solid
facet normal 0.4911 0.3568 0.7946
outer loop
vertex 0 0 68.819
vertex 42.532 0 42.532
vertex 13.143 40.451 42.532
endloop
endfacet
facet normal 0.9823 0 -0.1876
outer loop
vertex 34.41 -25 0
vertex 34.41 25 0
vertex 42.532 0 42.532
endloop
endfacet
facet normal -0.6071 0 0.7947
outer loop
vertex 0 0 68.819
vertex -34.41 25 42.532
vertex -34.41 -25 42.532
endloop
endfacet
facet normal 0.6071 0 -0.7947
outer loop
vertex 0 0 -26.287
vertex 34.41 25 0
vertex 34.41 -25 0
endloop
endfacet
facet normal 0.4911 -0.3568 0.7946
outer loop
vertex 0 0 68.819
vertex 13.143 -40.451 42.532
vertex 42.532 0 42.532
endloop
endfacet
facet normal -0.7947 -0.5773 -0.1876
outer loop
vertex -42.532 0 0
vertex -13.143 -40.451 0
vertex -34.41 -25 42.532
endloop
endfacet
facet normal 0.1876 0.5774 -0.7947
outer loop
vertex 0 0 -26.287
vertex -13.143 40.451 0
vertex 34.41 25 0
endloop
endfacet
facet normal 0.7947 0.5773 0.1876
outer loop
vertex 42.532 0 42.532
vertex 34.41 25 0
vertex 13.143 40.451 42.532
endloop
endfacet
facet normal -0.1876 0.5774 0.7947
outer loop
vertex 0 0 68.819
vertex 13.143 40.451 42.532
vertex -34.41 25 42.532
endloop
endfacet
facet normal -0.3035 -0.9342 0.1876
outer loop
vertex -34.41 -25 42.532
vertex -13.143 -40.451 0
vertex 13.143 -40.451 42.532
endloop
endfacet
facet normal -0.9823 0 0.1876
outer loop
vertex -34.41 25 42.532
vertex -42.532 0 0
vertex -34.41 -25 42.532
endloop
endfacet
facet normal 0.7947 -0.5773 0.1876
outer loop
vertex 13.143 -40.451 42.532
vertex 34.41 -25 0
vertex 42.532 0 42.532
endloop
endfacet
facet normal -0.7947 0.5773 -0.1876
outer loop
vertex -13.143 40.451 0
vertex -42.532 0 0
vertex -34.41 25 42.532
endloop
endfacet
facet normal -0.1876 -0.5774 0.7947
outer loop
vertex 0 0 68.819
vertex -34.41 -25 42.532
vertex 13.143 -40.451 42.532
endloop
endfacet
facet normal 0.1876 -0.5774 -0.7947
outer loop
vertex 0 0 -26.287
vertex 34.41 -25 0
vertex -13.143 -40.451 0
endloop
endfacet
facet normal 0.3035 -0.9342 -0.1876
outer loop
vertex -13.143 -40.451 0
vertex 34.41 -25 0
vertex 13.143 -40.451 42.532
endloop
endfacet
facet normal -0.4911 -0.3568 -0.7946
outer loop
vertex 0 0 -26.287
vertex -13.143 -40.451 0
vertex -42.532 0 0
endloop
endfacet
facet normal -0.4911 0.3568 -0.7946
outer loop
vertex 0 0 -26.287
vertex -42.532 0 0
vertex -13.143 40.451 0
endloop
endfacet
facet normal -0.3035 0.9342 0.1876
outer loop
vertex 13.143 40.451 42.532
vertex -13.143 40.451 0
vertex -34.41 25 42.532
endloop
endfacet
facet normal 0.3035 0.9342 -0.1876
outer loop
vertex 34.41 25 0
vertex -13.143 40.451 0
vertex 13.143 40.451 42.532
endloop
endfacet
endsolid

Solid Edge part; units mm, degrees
sketch "Sketch1" plane through (0, 0, 0) normal (0, -1, 0) x (1, 0, 0)
  arc A0 (0, -40.3674) -> (0, 87.4202) centre (0, 23.5264) cw
  line L0 (0, 87.4202) -> (0, -40.3674)
revolve "RevolvedProtrusion1" add sketch "Sketch1" angle 360 about axis through (0, 0, 87.4202) along (0, 0, -1)
sketch "Sketch2" plane through (0, 0, 0) normal (0, -1, 0) x (1, 0, 0)
  line L0 (42.5325, 42.5325) -> (34.4095, 0)
  line L1 (0, -26.2866) -> (34.4095, 0)
extrude "Cutout1" cut sketch "Sketch2" along normal mid plane 225.678 material side at (38.5201, 0, 21.2569)
sketch "Sketch3" plane through (0, 0, 0) normal (0, -1, 0) x (1, 0, 0)
  line L0 (-34.4095, 42.5325) -> (0, 68.8191)
  line L1 (-42.5325, 0) -> (-34.4095, 42.5325)
extrude "ExtrudedCutout_2" cut sketch "Sketch3" along normal mid plane 171.0823 material side at (-17.2351, 0, 55.7155)
pattern_circular "Pattern1" count 5 over 360 about axis through (0, 0, 0) along (0, 0, 1) of "Cutout1", "ExtrudedCutout_2"
